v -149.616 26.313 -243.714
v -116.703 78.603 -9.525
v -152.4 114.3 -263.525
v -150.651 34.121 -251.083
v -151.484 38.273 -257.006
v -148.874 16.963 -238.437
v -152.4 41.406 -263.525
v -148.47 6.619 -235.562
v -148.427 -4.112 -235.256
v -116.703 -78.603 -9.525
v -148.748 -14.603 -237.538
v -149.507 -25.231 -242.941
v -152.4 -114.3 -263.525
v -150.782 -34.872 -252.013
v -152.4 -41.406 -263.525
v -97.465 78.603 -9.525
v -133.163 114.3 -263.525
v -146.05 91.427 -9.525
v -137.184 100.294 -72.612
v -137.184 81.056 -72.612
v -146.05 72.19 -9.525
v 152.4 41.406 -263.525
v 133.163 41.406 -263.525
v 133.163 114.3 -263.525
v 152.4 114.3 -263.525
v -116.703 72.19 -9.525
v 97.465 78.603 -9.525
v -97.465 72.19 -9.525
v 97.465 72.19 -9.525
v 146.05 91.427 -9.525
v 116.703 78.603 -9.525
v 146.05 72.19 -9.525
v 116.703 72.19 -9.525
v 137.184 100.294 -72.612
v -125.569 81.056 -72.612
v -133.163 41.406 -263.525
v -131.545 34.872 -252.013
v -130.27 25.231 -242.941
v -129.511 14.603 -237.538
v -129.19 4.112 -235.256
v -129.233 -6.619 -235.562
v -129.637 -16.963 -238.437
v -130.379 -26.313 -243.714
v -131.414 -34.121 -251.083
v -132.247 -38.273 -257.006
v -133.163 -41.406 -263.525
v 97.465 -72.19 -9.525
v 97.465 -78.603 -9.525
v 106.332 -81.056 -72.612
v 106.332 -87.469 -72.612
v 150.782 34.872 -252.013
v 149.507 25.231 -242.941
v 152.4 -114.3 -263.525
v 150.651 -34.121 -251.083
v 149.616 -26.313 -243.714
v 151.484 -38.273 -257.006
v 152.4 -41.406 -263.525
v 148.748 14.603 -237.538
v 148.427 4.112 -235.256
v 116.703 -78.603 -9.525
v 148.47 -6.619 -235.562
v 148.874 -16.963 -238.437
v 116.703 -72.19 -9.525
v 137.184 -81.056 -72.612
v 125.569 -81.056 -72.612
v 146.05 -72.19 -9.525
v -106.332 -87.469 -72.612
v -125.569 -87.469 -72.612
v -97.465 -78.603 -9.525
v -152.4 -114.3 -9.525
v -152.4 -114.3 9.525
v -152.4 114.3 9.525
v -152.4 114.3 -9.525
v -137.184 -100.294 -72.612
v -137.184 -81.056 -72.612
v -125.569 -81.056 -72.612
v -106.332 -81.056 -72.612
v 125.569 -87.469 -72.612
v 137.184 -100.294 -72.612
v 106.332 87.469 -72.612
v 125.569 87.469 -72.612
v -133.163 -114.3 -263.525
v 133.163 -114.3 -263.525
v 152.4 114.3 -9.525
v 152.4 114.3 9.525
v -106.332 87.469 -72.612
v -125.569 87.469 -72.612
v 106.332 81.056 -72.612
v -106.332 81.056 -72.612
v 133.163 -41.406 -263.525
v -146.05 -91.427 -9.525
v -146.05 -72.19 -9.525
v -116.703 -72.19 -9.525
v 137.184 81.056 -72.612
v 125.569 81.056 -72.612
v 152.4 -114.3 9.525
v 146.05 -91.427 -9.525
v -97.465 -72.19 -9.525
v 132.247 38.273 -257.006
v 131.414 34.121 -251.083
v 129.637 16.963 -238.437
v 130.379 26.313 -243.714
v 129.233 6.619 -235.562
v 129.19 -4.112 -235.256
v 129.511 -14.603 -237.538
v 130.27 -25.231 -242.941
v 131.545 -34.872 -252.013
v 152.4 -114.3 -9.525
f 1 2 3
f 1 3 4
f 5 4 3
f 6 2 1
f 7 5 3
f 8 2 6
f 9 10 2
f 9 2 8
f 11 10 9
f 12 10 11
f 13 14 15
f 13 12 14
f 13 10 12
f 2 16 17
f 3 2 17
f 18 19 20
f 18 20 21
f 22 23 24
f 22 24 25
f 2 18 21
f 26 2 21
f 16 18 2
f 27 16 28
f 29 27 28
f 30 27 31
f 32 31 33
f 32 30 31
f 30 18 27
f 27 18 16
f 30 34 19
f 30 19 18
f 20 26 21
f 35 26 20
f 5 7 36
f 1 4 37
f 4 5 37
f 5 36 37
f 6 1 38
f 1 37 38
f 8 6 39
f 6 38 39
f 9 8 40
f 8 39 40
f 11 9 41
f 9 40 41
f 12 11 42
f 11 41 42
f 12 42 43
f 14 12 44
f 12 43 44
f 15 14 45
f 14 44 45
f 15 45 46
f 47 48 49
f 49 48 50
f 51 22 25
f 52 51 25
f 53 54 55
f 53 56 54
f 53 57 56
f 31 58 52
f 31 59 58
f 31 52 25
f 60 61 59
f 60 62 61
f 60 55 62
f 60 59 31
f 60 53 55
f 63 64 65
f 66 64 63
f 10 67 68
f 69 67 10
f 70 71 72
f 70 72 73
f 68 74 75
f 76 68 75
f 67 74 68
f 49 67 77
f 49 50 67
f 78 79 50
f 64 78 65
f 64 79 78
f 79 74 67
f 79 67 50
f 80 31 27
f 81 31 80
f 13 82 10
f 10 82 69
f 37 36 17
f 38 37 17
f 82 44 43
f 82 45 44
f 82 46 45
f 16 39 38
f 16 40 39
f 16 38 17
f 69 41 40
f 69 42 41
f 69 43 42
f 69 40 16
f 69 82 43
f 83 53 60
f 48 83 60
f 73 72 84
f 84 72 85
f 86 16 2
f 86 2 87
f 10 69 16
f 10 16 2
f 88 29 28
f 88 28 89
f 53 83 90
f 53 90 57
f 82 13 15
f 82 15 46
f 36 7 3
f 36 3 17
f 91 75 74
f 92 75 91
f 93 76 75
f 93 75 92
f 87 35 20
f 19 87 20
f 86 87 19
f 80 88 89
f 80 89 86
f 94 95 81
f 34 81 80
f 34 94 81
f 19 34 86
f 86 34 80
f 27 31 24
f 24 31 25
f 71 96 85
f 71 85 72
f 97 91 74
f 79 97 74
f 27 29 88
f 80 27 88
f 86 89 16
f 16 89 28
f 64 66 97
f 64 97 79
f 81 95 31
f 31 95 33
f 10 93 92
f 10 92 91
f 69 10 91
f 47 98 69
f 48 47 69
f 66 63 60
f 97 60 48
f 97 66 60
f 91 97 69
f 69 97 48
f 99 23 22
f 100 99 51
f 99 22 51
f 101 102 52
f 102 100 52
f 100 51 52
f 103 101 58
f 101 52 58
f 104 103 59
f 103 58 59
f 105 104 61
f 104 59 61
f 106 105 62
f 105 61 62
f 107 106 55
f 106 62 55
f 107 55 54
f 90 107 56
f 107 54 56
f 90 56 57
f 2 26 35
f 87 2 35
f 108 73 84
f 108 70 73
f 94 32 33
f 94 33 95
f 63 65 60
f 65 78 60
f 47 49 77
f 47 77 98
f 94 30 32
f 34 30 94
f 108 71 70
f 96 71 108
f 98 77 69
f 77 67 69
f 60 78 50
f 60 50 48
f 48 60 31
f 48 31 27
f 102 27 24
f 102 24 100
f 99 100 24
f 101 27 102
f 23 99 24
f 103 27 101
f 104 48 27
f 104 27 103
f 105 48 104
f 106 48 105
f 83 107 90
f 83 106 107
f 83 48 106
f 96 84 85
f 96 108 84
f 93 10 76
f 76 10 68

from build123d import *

# Parameters (mm, degrees)
F1_DEPTH      = 114.3
F2_DEPTH      = 114.3
F2_DEPTH_BACK = 114.3
F4_DEPTH      = 152.401
F4_DEPTH_BACK = 152.401
F6_DEPTH      = 152.4
F6_DEPTH_BACK = 152.4
F7_DEPTH      = 114.3010000004
F7_DEPTH_BACK = 114.3010000004


with BuildPart() as f1:
    # F0 (on Front) → F1 (new body, symmetric)
    with BuildSketch(Plane.XZ):
        Polygon((152.4, -9.525), (152.4, 9.525), (-152.4, 9.525), (-152.4, -9.525), (-146.05, -9.525), (-116.7026279856, -9.525), (-97.4654127291, -9.525), (97.4654127291, -9.525), (116.7026279856, -9.525), (146.05, -9.525), align=None)
    extrude(amount=F1_DEPTH, both=True)


with BuildPart() as f2:
    # F0 (on Front) → F2 (new body, two sides)
    with BuildSketch(Plane.XZ) as f2_sk:
        Polygon((-97.4654127291, -9.525), (-116.7026279856, -9.525), (-125.568870422, -72.6115929831), (-106.3316551655, -72.6115929831), align=None)
        Polygon((-106.3316551655, -72.6115929831), (-125.568870422, -72.6115929831), (-152.4, -263.525), (-133.1627847435, -263.525), align=None)
    extrude(amount=F2_DEPTH)
    extrude(f2_sk.sketch, amount=-F2_DEPTH_BACK)


with BuildPart() as f2b:
    # F0 (on Front) → F2, piece 2 (new body, two sides)
    with BuildSketch(Plane.XZ) as f2_2_sk:
        Polygon((125.568870422, -72.6115929831), (116.7026279856, -9.525), (97.4654127291, -9.525), (106.3316551655, -72.6115929831), align=None)
        Polygon((152.4, -263.525), (125.568870422, -72.6115929831), (106.3316551655, -72.6115929831), (133.1627847435, -263.525), align=None)
    extrude(amount=F2_DEPTH)
    extrude(f2_2_sk.sketch, amount=-F2_DEPTH_BACK)


with BuildPart() as f4_tool:
    # F3 (on Right) → F4 (new body, two sides)
    with BuildSketch(Plane.YZ) as f4_sk:
        with BuildLine():
            Line((-3e-10, -263.525), (41.4061397314, -263.525))
            ThreePointArc((41.4061397314, -263.525), (0, -235.0649995652), (-41.4061397314, -263.525))
            Line((-41.4061397314, -263.525), (-3e-10, -263.525))
        make_face()
        Polygon((-114.3000000004, -263.525), (-78.6026279859, -9.525), (-114.3000000004, -9.525), align=None)
        Polygon((114.2999999998, -263.525), (114.2999999998, -9.525), (78.6026279859, -9.525), align=None)
    extrude(amount=F4_DEPTH)
    extrude(f4_sk.sketch, amount=-F4_DEPTH_BACK)


with BuildPart() as f2_1:
    add(f2.part)

    # F4: cut by f4_tool
    add(f4_tool.part, mode=Mode.SUBTRACT)


with BuildPart() as f2b_1:
    add(f2b.part)

    # F4: cut by f4_tool
    add(f4_tool.part, mode=Mode.SUBTRACT)


with BuildPart() as f6:
    # F5 (on Right) → F6 (new body, two sides)
    with BuildSketch(Plane.YZ) as f6_sk:
        Polygon((78.6026279859, -9.525), (72.1902229004, -9.525), (81.0564653368, -72.6115929831), (87.4688704223, -72.6115929831), align=None)
        Polygon((91.4274381569, -9.525), (78.6026279859, -9.525), (87.4688704223, -72.6115929831), (100.2936805933, -72.6115929831), align=None)
    extrude(amount=F6_DEPTH)
    extrude(f6_sk.sketch, amount=-F6_DEPTH_BACK)


with BuildPart() as f6b:
    # F5 (on Right) → F6, piece 2 (new body, two sides)
    with BuildSketch(Plane.YZ) as f6_2_sk:
        Polygon((-100.2936805933, -72.6115929831), (-87.4688704223, -72.6115929831), (-78.6026279859, -9.525), (-91.4274381569, -9.525), align=None)
        Polygon((-78.6026279859, -9.525), (-87.4688704223, -72.6115929831), (-81.0564653368, -72.6115929831), (-72.1902229004, -9.525), align=None)
    extrude(amount=F6_DEPTH)
    extrude(f6_2_sk.sketch, amount=-F6_DEPTH_BACK)


with BuildPart() as f7_tool:
    # F0 (on Front) → F7 (new body, two sides)
    with BuildSketch(Plane.XZ) as f7_sk:
        Polygon((-146.05, -9.525), (-152.4, -9.525), (-152.4, -72.6115929831), (-137.1837575636, -72.6115929831), align=None)
        Polygon((152.4, -72.6115929831), (152.4, -9.525), (146.05, -9.525), (137.1837575636, -72.6115929831), align=None)
    extrude(amount=-F7_DEPTH)
    extrude(f7_sk.sketch, amount=F7_DEPTH_BACK)


with BuildPart() as f6_1:
    add(f6.part)

    # F7: cut by f7_tool
    add(f7_tool.part, mode=Mode.SUBTRACT)

    # F9: cut F2
    add(f2_1.part, mode=Mode.SUBTRACT)

    # F10: cut F2b
    add(f2b_1.part, mode=Mode.SUBTRACT)


with BuildPart() as f6b_1:
    add(f6b.part)

    # F7: cut by f7_tool
    add(f7_tool.part, mode=Mode.SUBTRACT)

    # F8: cut F2
    add(f2_1.part, mode=Mode.SUBTRACT)

    # F11: cut F2b
    add(f2b_1.part, mode=Mode.SUBTRACT)


solid = Compound([f1.part, f2_1.part, f2b_1.part, f6_1.part, f6b_1.part])
